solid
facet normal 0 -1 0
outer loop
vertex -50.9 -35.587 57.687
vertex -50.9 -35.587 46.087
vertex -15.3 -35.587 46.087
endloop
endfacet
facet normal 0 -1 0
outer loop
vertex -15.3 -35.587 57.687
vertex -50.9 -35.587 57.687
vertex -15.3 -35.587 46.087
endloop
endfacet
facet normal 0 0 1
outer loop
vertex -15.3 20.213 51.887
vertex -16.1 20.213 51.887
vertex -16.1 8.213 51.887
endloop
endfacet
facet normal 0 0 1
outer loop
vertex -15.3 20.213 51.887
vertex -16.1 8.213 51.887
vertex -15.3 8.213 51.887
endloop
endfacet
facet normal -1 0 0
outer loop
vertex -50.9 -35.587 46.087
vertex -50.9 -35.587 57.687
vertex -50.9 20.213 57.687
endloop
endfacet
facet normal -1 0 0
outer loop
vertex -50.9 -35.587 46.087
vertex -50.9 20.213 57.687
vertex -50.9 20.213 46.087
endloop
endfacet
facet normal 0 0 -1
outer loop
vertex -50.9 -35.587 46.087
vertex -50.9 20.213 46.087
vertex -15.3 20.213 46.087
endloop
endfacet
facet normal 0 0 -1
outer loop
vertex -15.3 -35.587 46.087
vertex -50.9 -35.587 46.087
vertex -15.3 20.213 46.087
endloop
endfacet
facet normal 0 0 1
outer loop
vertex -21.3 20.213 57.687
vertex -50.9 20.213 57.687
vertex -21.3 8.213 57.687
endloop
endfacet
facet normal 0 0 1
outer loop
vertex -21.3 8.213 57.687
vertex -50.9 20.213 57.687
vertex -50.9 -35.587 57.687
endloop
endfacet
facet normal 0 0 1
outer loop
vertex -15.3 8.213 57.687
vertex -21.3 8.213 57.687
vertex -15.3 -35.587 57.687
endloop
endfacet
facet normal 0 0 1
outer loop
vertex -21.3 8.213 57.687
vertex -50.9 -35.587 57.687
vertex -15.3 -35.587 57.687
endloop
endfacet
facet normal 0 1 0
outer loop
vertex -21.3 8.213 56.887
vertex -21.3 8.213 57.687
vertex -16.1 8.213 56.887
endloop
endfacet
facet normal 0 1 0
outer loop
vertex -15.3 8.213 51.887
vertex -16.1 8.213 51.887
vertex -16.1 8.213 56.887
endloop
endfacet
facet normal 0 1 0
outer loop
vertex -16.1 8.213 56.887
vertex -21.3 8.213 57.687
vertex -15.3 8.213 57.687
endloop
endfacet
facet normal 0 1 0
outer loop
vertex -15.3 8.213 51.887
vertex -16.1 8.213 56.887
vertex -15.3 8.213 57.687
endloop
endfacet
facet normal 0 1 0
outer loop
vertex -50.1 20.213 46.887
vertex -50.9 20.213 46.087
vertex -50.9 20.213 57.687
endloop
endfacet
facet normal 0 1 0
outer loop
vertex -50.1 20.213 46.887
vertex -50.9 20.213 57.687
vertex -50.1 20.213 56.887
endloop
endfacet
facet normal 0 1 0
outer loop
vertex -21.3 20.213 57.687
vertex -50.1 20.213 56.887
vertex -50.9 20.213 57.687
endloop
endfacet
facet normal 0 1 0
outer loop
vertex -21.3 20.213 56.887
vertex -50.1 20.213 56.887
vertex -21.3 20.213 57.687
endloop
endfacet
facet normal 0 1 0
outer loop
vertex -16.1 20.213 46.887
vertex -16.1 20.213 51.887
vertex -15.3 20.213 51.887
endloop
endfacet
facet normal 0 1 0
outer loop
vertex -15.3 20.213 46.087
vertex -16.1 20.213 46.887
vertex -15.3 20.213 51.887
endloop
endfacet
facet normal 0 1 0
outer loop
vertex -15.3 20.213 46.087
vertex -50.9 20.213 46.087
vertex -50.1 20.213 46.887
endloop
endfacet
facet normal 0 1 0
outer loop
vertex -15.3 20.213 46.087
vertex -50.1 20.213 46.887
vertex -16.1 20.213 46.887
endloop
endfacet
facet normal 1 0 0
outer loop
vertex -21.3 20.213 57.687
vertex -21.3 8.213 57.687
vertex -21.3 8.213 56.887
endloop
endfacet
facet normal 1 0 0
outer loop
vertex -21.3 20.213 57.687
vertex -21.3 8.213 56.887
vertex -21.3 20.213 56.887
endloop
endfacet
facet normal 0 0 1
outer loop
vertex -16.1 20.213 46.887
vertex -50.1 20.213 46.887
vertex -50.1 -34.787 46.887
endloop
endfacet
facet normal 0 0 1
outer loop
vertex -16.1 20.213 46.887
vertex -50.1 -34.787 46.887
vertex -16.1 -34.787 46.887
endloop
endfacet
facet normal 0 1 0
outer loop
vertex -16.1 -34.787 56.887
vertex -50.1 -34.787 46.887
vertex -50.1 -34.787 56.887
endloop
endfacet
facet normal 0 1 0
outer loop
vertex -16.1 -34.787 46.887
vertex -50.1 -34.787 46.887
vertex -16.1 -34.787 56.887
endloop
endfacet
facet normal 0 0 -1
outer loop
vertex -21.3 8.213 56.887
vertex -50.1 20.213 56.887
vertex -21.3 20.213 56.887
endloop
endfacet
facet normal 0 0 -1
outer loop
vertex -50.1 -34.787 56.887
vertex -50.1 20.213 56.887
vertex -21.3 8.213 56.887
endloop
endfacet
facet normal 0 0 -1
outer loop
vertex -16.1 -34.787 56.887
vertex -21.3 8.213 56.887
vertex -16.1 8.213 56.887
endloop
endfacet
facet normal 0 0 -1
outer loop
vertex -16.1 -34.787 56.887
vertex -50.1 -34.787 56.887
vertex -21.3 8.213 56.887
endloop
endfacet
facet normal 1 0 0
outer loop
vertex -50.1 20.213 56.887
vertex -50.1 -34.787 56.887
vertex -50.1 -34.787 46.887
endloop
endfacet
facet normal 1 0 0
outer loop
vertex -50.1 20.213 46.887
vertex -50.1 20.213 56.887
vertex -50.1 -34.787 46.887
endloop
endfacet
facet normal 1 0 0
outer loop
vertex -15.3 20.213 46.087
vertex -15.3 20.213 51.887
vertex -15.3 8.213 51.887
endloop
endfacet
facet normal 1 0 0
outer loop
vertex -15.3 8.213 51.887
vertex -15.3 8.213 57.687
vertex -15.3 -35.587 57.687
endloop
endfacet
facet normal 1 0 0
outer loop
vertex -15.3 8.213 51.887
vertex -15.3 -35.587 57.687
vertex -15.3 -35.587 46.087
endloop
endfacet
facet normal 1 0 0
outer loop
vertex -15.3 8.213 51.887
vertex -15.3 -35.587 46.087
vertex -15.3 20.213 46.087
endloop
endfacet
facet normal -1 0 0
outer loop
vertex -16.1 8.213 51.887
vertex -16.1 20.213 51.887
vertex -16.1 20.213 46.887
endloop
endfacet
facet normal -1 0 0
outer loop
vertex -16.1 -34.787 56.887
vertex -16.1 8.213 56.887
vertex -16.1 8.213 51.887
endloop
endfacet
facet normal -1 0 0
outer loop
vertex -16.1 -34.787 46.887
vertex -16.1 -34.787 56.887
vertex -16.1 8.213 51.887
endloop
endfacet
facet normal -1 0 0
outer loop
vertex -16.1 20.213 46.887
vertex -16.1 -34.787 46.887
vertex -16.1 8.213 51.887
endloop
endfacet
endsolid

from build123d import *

# Parameters (mm, degrees)
SKETCH016_W             = 35.6
SKETCH016_H             = 11.6
PAD009_DEPTH            = 0.8
SKETCH017_W             = 35.6
SKETCH017_H             = 11.6
SKETCH017_W_2           = 34
SKETCH017_H_2           = 10
PAD010_DEPTH            = 55.8
SKETCH018_W             = 6
SKETCH018_H             = 12
POCKET007_DEPTH         = 5.8
BODY005_PLACEMENT_ANGLE = 270


with BuildPart() as part:
    # Sketch016 → Pad009 (new body)
    with BuildSketch(Plane.XY):
        Rectangle(SKETCH016_W, SKETCH016_H)
    extrude(amount=PAD009_DEPTH)

    # Sketch017 → Pad010 (join)
    with BuildSketch(Plane.XY):
        Rectangle(SKETCH017_W, SKETCH017_H)
        Rectangle(SKETCH017_W_2, SKETCH017_H_2, mode=Mode.SUBTRACT)
    extrude(amount=PAD010_DEPTH)

    # Sketch018 (on Face5 of Pad010) → Pocket007 (cut)
    with BuildSketch(Plane.XZ.offset(5.8)):
        with Locations((14.8, 49.8)):
            Rectangle(SKETCH018_W, SKETCH018_H)
    extrude(amount=-POCKET007_DEPTH, mode=Mode.SUBTRACT)


with BuildPart() as part_1:
    # Body005 placement: moved
    add(part.part.moved(Location((-33.1, -35.587276, 51.887276))).rotate(Axis((-33.1, -35.587276, 51.887276), (1, 0, 0)), BODY005_PLACEMENT_ANGLE))


solid = part_1.part
